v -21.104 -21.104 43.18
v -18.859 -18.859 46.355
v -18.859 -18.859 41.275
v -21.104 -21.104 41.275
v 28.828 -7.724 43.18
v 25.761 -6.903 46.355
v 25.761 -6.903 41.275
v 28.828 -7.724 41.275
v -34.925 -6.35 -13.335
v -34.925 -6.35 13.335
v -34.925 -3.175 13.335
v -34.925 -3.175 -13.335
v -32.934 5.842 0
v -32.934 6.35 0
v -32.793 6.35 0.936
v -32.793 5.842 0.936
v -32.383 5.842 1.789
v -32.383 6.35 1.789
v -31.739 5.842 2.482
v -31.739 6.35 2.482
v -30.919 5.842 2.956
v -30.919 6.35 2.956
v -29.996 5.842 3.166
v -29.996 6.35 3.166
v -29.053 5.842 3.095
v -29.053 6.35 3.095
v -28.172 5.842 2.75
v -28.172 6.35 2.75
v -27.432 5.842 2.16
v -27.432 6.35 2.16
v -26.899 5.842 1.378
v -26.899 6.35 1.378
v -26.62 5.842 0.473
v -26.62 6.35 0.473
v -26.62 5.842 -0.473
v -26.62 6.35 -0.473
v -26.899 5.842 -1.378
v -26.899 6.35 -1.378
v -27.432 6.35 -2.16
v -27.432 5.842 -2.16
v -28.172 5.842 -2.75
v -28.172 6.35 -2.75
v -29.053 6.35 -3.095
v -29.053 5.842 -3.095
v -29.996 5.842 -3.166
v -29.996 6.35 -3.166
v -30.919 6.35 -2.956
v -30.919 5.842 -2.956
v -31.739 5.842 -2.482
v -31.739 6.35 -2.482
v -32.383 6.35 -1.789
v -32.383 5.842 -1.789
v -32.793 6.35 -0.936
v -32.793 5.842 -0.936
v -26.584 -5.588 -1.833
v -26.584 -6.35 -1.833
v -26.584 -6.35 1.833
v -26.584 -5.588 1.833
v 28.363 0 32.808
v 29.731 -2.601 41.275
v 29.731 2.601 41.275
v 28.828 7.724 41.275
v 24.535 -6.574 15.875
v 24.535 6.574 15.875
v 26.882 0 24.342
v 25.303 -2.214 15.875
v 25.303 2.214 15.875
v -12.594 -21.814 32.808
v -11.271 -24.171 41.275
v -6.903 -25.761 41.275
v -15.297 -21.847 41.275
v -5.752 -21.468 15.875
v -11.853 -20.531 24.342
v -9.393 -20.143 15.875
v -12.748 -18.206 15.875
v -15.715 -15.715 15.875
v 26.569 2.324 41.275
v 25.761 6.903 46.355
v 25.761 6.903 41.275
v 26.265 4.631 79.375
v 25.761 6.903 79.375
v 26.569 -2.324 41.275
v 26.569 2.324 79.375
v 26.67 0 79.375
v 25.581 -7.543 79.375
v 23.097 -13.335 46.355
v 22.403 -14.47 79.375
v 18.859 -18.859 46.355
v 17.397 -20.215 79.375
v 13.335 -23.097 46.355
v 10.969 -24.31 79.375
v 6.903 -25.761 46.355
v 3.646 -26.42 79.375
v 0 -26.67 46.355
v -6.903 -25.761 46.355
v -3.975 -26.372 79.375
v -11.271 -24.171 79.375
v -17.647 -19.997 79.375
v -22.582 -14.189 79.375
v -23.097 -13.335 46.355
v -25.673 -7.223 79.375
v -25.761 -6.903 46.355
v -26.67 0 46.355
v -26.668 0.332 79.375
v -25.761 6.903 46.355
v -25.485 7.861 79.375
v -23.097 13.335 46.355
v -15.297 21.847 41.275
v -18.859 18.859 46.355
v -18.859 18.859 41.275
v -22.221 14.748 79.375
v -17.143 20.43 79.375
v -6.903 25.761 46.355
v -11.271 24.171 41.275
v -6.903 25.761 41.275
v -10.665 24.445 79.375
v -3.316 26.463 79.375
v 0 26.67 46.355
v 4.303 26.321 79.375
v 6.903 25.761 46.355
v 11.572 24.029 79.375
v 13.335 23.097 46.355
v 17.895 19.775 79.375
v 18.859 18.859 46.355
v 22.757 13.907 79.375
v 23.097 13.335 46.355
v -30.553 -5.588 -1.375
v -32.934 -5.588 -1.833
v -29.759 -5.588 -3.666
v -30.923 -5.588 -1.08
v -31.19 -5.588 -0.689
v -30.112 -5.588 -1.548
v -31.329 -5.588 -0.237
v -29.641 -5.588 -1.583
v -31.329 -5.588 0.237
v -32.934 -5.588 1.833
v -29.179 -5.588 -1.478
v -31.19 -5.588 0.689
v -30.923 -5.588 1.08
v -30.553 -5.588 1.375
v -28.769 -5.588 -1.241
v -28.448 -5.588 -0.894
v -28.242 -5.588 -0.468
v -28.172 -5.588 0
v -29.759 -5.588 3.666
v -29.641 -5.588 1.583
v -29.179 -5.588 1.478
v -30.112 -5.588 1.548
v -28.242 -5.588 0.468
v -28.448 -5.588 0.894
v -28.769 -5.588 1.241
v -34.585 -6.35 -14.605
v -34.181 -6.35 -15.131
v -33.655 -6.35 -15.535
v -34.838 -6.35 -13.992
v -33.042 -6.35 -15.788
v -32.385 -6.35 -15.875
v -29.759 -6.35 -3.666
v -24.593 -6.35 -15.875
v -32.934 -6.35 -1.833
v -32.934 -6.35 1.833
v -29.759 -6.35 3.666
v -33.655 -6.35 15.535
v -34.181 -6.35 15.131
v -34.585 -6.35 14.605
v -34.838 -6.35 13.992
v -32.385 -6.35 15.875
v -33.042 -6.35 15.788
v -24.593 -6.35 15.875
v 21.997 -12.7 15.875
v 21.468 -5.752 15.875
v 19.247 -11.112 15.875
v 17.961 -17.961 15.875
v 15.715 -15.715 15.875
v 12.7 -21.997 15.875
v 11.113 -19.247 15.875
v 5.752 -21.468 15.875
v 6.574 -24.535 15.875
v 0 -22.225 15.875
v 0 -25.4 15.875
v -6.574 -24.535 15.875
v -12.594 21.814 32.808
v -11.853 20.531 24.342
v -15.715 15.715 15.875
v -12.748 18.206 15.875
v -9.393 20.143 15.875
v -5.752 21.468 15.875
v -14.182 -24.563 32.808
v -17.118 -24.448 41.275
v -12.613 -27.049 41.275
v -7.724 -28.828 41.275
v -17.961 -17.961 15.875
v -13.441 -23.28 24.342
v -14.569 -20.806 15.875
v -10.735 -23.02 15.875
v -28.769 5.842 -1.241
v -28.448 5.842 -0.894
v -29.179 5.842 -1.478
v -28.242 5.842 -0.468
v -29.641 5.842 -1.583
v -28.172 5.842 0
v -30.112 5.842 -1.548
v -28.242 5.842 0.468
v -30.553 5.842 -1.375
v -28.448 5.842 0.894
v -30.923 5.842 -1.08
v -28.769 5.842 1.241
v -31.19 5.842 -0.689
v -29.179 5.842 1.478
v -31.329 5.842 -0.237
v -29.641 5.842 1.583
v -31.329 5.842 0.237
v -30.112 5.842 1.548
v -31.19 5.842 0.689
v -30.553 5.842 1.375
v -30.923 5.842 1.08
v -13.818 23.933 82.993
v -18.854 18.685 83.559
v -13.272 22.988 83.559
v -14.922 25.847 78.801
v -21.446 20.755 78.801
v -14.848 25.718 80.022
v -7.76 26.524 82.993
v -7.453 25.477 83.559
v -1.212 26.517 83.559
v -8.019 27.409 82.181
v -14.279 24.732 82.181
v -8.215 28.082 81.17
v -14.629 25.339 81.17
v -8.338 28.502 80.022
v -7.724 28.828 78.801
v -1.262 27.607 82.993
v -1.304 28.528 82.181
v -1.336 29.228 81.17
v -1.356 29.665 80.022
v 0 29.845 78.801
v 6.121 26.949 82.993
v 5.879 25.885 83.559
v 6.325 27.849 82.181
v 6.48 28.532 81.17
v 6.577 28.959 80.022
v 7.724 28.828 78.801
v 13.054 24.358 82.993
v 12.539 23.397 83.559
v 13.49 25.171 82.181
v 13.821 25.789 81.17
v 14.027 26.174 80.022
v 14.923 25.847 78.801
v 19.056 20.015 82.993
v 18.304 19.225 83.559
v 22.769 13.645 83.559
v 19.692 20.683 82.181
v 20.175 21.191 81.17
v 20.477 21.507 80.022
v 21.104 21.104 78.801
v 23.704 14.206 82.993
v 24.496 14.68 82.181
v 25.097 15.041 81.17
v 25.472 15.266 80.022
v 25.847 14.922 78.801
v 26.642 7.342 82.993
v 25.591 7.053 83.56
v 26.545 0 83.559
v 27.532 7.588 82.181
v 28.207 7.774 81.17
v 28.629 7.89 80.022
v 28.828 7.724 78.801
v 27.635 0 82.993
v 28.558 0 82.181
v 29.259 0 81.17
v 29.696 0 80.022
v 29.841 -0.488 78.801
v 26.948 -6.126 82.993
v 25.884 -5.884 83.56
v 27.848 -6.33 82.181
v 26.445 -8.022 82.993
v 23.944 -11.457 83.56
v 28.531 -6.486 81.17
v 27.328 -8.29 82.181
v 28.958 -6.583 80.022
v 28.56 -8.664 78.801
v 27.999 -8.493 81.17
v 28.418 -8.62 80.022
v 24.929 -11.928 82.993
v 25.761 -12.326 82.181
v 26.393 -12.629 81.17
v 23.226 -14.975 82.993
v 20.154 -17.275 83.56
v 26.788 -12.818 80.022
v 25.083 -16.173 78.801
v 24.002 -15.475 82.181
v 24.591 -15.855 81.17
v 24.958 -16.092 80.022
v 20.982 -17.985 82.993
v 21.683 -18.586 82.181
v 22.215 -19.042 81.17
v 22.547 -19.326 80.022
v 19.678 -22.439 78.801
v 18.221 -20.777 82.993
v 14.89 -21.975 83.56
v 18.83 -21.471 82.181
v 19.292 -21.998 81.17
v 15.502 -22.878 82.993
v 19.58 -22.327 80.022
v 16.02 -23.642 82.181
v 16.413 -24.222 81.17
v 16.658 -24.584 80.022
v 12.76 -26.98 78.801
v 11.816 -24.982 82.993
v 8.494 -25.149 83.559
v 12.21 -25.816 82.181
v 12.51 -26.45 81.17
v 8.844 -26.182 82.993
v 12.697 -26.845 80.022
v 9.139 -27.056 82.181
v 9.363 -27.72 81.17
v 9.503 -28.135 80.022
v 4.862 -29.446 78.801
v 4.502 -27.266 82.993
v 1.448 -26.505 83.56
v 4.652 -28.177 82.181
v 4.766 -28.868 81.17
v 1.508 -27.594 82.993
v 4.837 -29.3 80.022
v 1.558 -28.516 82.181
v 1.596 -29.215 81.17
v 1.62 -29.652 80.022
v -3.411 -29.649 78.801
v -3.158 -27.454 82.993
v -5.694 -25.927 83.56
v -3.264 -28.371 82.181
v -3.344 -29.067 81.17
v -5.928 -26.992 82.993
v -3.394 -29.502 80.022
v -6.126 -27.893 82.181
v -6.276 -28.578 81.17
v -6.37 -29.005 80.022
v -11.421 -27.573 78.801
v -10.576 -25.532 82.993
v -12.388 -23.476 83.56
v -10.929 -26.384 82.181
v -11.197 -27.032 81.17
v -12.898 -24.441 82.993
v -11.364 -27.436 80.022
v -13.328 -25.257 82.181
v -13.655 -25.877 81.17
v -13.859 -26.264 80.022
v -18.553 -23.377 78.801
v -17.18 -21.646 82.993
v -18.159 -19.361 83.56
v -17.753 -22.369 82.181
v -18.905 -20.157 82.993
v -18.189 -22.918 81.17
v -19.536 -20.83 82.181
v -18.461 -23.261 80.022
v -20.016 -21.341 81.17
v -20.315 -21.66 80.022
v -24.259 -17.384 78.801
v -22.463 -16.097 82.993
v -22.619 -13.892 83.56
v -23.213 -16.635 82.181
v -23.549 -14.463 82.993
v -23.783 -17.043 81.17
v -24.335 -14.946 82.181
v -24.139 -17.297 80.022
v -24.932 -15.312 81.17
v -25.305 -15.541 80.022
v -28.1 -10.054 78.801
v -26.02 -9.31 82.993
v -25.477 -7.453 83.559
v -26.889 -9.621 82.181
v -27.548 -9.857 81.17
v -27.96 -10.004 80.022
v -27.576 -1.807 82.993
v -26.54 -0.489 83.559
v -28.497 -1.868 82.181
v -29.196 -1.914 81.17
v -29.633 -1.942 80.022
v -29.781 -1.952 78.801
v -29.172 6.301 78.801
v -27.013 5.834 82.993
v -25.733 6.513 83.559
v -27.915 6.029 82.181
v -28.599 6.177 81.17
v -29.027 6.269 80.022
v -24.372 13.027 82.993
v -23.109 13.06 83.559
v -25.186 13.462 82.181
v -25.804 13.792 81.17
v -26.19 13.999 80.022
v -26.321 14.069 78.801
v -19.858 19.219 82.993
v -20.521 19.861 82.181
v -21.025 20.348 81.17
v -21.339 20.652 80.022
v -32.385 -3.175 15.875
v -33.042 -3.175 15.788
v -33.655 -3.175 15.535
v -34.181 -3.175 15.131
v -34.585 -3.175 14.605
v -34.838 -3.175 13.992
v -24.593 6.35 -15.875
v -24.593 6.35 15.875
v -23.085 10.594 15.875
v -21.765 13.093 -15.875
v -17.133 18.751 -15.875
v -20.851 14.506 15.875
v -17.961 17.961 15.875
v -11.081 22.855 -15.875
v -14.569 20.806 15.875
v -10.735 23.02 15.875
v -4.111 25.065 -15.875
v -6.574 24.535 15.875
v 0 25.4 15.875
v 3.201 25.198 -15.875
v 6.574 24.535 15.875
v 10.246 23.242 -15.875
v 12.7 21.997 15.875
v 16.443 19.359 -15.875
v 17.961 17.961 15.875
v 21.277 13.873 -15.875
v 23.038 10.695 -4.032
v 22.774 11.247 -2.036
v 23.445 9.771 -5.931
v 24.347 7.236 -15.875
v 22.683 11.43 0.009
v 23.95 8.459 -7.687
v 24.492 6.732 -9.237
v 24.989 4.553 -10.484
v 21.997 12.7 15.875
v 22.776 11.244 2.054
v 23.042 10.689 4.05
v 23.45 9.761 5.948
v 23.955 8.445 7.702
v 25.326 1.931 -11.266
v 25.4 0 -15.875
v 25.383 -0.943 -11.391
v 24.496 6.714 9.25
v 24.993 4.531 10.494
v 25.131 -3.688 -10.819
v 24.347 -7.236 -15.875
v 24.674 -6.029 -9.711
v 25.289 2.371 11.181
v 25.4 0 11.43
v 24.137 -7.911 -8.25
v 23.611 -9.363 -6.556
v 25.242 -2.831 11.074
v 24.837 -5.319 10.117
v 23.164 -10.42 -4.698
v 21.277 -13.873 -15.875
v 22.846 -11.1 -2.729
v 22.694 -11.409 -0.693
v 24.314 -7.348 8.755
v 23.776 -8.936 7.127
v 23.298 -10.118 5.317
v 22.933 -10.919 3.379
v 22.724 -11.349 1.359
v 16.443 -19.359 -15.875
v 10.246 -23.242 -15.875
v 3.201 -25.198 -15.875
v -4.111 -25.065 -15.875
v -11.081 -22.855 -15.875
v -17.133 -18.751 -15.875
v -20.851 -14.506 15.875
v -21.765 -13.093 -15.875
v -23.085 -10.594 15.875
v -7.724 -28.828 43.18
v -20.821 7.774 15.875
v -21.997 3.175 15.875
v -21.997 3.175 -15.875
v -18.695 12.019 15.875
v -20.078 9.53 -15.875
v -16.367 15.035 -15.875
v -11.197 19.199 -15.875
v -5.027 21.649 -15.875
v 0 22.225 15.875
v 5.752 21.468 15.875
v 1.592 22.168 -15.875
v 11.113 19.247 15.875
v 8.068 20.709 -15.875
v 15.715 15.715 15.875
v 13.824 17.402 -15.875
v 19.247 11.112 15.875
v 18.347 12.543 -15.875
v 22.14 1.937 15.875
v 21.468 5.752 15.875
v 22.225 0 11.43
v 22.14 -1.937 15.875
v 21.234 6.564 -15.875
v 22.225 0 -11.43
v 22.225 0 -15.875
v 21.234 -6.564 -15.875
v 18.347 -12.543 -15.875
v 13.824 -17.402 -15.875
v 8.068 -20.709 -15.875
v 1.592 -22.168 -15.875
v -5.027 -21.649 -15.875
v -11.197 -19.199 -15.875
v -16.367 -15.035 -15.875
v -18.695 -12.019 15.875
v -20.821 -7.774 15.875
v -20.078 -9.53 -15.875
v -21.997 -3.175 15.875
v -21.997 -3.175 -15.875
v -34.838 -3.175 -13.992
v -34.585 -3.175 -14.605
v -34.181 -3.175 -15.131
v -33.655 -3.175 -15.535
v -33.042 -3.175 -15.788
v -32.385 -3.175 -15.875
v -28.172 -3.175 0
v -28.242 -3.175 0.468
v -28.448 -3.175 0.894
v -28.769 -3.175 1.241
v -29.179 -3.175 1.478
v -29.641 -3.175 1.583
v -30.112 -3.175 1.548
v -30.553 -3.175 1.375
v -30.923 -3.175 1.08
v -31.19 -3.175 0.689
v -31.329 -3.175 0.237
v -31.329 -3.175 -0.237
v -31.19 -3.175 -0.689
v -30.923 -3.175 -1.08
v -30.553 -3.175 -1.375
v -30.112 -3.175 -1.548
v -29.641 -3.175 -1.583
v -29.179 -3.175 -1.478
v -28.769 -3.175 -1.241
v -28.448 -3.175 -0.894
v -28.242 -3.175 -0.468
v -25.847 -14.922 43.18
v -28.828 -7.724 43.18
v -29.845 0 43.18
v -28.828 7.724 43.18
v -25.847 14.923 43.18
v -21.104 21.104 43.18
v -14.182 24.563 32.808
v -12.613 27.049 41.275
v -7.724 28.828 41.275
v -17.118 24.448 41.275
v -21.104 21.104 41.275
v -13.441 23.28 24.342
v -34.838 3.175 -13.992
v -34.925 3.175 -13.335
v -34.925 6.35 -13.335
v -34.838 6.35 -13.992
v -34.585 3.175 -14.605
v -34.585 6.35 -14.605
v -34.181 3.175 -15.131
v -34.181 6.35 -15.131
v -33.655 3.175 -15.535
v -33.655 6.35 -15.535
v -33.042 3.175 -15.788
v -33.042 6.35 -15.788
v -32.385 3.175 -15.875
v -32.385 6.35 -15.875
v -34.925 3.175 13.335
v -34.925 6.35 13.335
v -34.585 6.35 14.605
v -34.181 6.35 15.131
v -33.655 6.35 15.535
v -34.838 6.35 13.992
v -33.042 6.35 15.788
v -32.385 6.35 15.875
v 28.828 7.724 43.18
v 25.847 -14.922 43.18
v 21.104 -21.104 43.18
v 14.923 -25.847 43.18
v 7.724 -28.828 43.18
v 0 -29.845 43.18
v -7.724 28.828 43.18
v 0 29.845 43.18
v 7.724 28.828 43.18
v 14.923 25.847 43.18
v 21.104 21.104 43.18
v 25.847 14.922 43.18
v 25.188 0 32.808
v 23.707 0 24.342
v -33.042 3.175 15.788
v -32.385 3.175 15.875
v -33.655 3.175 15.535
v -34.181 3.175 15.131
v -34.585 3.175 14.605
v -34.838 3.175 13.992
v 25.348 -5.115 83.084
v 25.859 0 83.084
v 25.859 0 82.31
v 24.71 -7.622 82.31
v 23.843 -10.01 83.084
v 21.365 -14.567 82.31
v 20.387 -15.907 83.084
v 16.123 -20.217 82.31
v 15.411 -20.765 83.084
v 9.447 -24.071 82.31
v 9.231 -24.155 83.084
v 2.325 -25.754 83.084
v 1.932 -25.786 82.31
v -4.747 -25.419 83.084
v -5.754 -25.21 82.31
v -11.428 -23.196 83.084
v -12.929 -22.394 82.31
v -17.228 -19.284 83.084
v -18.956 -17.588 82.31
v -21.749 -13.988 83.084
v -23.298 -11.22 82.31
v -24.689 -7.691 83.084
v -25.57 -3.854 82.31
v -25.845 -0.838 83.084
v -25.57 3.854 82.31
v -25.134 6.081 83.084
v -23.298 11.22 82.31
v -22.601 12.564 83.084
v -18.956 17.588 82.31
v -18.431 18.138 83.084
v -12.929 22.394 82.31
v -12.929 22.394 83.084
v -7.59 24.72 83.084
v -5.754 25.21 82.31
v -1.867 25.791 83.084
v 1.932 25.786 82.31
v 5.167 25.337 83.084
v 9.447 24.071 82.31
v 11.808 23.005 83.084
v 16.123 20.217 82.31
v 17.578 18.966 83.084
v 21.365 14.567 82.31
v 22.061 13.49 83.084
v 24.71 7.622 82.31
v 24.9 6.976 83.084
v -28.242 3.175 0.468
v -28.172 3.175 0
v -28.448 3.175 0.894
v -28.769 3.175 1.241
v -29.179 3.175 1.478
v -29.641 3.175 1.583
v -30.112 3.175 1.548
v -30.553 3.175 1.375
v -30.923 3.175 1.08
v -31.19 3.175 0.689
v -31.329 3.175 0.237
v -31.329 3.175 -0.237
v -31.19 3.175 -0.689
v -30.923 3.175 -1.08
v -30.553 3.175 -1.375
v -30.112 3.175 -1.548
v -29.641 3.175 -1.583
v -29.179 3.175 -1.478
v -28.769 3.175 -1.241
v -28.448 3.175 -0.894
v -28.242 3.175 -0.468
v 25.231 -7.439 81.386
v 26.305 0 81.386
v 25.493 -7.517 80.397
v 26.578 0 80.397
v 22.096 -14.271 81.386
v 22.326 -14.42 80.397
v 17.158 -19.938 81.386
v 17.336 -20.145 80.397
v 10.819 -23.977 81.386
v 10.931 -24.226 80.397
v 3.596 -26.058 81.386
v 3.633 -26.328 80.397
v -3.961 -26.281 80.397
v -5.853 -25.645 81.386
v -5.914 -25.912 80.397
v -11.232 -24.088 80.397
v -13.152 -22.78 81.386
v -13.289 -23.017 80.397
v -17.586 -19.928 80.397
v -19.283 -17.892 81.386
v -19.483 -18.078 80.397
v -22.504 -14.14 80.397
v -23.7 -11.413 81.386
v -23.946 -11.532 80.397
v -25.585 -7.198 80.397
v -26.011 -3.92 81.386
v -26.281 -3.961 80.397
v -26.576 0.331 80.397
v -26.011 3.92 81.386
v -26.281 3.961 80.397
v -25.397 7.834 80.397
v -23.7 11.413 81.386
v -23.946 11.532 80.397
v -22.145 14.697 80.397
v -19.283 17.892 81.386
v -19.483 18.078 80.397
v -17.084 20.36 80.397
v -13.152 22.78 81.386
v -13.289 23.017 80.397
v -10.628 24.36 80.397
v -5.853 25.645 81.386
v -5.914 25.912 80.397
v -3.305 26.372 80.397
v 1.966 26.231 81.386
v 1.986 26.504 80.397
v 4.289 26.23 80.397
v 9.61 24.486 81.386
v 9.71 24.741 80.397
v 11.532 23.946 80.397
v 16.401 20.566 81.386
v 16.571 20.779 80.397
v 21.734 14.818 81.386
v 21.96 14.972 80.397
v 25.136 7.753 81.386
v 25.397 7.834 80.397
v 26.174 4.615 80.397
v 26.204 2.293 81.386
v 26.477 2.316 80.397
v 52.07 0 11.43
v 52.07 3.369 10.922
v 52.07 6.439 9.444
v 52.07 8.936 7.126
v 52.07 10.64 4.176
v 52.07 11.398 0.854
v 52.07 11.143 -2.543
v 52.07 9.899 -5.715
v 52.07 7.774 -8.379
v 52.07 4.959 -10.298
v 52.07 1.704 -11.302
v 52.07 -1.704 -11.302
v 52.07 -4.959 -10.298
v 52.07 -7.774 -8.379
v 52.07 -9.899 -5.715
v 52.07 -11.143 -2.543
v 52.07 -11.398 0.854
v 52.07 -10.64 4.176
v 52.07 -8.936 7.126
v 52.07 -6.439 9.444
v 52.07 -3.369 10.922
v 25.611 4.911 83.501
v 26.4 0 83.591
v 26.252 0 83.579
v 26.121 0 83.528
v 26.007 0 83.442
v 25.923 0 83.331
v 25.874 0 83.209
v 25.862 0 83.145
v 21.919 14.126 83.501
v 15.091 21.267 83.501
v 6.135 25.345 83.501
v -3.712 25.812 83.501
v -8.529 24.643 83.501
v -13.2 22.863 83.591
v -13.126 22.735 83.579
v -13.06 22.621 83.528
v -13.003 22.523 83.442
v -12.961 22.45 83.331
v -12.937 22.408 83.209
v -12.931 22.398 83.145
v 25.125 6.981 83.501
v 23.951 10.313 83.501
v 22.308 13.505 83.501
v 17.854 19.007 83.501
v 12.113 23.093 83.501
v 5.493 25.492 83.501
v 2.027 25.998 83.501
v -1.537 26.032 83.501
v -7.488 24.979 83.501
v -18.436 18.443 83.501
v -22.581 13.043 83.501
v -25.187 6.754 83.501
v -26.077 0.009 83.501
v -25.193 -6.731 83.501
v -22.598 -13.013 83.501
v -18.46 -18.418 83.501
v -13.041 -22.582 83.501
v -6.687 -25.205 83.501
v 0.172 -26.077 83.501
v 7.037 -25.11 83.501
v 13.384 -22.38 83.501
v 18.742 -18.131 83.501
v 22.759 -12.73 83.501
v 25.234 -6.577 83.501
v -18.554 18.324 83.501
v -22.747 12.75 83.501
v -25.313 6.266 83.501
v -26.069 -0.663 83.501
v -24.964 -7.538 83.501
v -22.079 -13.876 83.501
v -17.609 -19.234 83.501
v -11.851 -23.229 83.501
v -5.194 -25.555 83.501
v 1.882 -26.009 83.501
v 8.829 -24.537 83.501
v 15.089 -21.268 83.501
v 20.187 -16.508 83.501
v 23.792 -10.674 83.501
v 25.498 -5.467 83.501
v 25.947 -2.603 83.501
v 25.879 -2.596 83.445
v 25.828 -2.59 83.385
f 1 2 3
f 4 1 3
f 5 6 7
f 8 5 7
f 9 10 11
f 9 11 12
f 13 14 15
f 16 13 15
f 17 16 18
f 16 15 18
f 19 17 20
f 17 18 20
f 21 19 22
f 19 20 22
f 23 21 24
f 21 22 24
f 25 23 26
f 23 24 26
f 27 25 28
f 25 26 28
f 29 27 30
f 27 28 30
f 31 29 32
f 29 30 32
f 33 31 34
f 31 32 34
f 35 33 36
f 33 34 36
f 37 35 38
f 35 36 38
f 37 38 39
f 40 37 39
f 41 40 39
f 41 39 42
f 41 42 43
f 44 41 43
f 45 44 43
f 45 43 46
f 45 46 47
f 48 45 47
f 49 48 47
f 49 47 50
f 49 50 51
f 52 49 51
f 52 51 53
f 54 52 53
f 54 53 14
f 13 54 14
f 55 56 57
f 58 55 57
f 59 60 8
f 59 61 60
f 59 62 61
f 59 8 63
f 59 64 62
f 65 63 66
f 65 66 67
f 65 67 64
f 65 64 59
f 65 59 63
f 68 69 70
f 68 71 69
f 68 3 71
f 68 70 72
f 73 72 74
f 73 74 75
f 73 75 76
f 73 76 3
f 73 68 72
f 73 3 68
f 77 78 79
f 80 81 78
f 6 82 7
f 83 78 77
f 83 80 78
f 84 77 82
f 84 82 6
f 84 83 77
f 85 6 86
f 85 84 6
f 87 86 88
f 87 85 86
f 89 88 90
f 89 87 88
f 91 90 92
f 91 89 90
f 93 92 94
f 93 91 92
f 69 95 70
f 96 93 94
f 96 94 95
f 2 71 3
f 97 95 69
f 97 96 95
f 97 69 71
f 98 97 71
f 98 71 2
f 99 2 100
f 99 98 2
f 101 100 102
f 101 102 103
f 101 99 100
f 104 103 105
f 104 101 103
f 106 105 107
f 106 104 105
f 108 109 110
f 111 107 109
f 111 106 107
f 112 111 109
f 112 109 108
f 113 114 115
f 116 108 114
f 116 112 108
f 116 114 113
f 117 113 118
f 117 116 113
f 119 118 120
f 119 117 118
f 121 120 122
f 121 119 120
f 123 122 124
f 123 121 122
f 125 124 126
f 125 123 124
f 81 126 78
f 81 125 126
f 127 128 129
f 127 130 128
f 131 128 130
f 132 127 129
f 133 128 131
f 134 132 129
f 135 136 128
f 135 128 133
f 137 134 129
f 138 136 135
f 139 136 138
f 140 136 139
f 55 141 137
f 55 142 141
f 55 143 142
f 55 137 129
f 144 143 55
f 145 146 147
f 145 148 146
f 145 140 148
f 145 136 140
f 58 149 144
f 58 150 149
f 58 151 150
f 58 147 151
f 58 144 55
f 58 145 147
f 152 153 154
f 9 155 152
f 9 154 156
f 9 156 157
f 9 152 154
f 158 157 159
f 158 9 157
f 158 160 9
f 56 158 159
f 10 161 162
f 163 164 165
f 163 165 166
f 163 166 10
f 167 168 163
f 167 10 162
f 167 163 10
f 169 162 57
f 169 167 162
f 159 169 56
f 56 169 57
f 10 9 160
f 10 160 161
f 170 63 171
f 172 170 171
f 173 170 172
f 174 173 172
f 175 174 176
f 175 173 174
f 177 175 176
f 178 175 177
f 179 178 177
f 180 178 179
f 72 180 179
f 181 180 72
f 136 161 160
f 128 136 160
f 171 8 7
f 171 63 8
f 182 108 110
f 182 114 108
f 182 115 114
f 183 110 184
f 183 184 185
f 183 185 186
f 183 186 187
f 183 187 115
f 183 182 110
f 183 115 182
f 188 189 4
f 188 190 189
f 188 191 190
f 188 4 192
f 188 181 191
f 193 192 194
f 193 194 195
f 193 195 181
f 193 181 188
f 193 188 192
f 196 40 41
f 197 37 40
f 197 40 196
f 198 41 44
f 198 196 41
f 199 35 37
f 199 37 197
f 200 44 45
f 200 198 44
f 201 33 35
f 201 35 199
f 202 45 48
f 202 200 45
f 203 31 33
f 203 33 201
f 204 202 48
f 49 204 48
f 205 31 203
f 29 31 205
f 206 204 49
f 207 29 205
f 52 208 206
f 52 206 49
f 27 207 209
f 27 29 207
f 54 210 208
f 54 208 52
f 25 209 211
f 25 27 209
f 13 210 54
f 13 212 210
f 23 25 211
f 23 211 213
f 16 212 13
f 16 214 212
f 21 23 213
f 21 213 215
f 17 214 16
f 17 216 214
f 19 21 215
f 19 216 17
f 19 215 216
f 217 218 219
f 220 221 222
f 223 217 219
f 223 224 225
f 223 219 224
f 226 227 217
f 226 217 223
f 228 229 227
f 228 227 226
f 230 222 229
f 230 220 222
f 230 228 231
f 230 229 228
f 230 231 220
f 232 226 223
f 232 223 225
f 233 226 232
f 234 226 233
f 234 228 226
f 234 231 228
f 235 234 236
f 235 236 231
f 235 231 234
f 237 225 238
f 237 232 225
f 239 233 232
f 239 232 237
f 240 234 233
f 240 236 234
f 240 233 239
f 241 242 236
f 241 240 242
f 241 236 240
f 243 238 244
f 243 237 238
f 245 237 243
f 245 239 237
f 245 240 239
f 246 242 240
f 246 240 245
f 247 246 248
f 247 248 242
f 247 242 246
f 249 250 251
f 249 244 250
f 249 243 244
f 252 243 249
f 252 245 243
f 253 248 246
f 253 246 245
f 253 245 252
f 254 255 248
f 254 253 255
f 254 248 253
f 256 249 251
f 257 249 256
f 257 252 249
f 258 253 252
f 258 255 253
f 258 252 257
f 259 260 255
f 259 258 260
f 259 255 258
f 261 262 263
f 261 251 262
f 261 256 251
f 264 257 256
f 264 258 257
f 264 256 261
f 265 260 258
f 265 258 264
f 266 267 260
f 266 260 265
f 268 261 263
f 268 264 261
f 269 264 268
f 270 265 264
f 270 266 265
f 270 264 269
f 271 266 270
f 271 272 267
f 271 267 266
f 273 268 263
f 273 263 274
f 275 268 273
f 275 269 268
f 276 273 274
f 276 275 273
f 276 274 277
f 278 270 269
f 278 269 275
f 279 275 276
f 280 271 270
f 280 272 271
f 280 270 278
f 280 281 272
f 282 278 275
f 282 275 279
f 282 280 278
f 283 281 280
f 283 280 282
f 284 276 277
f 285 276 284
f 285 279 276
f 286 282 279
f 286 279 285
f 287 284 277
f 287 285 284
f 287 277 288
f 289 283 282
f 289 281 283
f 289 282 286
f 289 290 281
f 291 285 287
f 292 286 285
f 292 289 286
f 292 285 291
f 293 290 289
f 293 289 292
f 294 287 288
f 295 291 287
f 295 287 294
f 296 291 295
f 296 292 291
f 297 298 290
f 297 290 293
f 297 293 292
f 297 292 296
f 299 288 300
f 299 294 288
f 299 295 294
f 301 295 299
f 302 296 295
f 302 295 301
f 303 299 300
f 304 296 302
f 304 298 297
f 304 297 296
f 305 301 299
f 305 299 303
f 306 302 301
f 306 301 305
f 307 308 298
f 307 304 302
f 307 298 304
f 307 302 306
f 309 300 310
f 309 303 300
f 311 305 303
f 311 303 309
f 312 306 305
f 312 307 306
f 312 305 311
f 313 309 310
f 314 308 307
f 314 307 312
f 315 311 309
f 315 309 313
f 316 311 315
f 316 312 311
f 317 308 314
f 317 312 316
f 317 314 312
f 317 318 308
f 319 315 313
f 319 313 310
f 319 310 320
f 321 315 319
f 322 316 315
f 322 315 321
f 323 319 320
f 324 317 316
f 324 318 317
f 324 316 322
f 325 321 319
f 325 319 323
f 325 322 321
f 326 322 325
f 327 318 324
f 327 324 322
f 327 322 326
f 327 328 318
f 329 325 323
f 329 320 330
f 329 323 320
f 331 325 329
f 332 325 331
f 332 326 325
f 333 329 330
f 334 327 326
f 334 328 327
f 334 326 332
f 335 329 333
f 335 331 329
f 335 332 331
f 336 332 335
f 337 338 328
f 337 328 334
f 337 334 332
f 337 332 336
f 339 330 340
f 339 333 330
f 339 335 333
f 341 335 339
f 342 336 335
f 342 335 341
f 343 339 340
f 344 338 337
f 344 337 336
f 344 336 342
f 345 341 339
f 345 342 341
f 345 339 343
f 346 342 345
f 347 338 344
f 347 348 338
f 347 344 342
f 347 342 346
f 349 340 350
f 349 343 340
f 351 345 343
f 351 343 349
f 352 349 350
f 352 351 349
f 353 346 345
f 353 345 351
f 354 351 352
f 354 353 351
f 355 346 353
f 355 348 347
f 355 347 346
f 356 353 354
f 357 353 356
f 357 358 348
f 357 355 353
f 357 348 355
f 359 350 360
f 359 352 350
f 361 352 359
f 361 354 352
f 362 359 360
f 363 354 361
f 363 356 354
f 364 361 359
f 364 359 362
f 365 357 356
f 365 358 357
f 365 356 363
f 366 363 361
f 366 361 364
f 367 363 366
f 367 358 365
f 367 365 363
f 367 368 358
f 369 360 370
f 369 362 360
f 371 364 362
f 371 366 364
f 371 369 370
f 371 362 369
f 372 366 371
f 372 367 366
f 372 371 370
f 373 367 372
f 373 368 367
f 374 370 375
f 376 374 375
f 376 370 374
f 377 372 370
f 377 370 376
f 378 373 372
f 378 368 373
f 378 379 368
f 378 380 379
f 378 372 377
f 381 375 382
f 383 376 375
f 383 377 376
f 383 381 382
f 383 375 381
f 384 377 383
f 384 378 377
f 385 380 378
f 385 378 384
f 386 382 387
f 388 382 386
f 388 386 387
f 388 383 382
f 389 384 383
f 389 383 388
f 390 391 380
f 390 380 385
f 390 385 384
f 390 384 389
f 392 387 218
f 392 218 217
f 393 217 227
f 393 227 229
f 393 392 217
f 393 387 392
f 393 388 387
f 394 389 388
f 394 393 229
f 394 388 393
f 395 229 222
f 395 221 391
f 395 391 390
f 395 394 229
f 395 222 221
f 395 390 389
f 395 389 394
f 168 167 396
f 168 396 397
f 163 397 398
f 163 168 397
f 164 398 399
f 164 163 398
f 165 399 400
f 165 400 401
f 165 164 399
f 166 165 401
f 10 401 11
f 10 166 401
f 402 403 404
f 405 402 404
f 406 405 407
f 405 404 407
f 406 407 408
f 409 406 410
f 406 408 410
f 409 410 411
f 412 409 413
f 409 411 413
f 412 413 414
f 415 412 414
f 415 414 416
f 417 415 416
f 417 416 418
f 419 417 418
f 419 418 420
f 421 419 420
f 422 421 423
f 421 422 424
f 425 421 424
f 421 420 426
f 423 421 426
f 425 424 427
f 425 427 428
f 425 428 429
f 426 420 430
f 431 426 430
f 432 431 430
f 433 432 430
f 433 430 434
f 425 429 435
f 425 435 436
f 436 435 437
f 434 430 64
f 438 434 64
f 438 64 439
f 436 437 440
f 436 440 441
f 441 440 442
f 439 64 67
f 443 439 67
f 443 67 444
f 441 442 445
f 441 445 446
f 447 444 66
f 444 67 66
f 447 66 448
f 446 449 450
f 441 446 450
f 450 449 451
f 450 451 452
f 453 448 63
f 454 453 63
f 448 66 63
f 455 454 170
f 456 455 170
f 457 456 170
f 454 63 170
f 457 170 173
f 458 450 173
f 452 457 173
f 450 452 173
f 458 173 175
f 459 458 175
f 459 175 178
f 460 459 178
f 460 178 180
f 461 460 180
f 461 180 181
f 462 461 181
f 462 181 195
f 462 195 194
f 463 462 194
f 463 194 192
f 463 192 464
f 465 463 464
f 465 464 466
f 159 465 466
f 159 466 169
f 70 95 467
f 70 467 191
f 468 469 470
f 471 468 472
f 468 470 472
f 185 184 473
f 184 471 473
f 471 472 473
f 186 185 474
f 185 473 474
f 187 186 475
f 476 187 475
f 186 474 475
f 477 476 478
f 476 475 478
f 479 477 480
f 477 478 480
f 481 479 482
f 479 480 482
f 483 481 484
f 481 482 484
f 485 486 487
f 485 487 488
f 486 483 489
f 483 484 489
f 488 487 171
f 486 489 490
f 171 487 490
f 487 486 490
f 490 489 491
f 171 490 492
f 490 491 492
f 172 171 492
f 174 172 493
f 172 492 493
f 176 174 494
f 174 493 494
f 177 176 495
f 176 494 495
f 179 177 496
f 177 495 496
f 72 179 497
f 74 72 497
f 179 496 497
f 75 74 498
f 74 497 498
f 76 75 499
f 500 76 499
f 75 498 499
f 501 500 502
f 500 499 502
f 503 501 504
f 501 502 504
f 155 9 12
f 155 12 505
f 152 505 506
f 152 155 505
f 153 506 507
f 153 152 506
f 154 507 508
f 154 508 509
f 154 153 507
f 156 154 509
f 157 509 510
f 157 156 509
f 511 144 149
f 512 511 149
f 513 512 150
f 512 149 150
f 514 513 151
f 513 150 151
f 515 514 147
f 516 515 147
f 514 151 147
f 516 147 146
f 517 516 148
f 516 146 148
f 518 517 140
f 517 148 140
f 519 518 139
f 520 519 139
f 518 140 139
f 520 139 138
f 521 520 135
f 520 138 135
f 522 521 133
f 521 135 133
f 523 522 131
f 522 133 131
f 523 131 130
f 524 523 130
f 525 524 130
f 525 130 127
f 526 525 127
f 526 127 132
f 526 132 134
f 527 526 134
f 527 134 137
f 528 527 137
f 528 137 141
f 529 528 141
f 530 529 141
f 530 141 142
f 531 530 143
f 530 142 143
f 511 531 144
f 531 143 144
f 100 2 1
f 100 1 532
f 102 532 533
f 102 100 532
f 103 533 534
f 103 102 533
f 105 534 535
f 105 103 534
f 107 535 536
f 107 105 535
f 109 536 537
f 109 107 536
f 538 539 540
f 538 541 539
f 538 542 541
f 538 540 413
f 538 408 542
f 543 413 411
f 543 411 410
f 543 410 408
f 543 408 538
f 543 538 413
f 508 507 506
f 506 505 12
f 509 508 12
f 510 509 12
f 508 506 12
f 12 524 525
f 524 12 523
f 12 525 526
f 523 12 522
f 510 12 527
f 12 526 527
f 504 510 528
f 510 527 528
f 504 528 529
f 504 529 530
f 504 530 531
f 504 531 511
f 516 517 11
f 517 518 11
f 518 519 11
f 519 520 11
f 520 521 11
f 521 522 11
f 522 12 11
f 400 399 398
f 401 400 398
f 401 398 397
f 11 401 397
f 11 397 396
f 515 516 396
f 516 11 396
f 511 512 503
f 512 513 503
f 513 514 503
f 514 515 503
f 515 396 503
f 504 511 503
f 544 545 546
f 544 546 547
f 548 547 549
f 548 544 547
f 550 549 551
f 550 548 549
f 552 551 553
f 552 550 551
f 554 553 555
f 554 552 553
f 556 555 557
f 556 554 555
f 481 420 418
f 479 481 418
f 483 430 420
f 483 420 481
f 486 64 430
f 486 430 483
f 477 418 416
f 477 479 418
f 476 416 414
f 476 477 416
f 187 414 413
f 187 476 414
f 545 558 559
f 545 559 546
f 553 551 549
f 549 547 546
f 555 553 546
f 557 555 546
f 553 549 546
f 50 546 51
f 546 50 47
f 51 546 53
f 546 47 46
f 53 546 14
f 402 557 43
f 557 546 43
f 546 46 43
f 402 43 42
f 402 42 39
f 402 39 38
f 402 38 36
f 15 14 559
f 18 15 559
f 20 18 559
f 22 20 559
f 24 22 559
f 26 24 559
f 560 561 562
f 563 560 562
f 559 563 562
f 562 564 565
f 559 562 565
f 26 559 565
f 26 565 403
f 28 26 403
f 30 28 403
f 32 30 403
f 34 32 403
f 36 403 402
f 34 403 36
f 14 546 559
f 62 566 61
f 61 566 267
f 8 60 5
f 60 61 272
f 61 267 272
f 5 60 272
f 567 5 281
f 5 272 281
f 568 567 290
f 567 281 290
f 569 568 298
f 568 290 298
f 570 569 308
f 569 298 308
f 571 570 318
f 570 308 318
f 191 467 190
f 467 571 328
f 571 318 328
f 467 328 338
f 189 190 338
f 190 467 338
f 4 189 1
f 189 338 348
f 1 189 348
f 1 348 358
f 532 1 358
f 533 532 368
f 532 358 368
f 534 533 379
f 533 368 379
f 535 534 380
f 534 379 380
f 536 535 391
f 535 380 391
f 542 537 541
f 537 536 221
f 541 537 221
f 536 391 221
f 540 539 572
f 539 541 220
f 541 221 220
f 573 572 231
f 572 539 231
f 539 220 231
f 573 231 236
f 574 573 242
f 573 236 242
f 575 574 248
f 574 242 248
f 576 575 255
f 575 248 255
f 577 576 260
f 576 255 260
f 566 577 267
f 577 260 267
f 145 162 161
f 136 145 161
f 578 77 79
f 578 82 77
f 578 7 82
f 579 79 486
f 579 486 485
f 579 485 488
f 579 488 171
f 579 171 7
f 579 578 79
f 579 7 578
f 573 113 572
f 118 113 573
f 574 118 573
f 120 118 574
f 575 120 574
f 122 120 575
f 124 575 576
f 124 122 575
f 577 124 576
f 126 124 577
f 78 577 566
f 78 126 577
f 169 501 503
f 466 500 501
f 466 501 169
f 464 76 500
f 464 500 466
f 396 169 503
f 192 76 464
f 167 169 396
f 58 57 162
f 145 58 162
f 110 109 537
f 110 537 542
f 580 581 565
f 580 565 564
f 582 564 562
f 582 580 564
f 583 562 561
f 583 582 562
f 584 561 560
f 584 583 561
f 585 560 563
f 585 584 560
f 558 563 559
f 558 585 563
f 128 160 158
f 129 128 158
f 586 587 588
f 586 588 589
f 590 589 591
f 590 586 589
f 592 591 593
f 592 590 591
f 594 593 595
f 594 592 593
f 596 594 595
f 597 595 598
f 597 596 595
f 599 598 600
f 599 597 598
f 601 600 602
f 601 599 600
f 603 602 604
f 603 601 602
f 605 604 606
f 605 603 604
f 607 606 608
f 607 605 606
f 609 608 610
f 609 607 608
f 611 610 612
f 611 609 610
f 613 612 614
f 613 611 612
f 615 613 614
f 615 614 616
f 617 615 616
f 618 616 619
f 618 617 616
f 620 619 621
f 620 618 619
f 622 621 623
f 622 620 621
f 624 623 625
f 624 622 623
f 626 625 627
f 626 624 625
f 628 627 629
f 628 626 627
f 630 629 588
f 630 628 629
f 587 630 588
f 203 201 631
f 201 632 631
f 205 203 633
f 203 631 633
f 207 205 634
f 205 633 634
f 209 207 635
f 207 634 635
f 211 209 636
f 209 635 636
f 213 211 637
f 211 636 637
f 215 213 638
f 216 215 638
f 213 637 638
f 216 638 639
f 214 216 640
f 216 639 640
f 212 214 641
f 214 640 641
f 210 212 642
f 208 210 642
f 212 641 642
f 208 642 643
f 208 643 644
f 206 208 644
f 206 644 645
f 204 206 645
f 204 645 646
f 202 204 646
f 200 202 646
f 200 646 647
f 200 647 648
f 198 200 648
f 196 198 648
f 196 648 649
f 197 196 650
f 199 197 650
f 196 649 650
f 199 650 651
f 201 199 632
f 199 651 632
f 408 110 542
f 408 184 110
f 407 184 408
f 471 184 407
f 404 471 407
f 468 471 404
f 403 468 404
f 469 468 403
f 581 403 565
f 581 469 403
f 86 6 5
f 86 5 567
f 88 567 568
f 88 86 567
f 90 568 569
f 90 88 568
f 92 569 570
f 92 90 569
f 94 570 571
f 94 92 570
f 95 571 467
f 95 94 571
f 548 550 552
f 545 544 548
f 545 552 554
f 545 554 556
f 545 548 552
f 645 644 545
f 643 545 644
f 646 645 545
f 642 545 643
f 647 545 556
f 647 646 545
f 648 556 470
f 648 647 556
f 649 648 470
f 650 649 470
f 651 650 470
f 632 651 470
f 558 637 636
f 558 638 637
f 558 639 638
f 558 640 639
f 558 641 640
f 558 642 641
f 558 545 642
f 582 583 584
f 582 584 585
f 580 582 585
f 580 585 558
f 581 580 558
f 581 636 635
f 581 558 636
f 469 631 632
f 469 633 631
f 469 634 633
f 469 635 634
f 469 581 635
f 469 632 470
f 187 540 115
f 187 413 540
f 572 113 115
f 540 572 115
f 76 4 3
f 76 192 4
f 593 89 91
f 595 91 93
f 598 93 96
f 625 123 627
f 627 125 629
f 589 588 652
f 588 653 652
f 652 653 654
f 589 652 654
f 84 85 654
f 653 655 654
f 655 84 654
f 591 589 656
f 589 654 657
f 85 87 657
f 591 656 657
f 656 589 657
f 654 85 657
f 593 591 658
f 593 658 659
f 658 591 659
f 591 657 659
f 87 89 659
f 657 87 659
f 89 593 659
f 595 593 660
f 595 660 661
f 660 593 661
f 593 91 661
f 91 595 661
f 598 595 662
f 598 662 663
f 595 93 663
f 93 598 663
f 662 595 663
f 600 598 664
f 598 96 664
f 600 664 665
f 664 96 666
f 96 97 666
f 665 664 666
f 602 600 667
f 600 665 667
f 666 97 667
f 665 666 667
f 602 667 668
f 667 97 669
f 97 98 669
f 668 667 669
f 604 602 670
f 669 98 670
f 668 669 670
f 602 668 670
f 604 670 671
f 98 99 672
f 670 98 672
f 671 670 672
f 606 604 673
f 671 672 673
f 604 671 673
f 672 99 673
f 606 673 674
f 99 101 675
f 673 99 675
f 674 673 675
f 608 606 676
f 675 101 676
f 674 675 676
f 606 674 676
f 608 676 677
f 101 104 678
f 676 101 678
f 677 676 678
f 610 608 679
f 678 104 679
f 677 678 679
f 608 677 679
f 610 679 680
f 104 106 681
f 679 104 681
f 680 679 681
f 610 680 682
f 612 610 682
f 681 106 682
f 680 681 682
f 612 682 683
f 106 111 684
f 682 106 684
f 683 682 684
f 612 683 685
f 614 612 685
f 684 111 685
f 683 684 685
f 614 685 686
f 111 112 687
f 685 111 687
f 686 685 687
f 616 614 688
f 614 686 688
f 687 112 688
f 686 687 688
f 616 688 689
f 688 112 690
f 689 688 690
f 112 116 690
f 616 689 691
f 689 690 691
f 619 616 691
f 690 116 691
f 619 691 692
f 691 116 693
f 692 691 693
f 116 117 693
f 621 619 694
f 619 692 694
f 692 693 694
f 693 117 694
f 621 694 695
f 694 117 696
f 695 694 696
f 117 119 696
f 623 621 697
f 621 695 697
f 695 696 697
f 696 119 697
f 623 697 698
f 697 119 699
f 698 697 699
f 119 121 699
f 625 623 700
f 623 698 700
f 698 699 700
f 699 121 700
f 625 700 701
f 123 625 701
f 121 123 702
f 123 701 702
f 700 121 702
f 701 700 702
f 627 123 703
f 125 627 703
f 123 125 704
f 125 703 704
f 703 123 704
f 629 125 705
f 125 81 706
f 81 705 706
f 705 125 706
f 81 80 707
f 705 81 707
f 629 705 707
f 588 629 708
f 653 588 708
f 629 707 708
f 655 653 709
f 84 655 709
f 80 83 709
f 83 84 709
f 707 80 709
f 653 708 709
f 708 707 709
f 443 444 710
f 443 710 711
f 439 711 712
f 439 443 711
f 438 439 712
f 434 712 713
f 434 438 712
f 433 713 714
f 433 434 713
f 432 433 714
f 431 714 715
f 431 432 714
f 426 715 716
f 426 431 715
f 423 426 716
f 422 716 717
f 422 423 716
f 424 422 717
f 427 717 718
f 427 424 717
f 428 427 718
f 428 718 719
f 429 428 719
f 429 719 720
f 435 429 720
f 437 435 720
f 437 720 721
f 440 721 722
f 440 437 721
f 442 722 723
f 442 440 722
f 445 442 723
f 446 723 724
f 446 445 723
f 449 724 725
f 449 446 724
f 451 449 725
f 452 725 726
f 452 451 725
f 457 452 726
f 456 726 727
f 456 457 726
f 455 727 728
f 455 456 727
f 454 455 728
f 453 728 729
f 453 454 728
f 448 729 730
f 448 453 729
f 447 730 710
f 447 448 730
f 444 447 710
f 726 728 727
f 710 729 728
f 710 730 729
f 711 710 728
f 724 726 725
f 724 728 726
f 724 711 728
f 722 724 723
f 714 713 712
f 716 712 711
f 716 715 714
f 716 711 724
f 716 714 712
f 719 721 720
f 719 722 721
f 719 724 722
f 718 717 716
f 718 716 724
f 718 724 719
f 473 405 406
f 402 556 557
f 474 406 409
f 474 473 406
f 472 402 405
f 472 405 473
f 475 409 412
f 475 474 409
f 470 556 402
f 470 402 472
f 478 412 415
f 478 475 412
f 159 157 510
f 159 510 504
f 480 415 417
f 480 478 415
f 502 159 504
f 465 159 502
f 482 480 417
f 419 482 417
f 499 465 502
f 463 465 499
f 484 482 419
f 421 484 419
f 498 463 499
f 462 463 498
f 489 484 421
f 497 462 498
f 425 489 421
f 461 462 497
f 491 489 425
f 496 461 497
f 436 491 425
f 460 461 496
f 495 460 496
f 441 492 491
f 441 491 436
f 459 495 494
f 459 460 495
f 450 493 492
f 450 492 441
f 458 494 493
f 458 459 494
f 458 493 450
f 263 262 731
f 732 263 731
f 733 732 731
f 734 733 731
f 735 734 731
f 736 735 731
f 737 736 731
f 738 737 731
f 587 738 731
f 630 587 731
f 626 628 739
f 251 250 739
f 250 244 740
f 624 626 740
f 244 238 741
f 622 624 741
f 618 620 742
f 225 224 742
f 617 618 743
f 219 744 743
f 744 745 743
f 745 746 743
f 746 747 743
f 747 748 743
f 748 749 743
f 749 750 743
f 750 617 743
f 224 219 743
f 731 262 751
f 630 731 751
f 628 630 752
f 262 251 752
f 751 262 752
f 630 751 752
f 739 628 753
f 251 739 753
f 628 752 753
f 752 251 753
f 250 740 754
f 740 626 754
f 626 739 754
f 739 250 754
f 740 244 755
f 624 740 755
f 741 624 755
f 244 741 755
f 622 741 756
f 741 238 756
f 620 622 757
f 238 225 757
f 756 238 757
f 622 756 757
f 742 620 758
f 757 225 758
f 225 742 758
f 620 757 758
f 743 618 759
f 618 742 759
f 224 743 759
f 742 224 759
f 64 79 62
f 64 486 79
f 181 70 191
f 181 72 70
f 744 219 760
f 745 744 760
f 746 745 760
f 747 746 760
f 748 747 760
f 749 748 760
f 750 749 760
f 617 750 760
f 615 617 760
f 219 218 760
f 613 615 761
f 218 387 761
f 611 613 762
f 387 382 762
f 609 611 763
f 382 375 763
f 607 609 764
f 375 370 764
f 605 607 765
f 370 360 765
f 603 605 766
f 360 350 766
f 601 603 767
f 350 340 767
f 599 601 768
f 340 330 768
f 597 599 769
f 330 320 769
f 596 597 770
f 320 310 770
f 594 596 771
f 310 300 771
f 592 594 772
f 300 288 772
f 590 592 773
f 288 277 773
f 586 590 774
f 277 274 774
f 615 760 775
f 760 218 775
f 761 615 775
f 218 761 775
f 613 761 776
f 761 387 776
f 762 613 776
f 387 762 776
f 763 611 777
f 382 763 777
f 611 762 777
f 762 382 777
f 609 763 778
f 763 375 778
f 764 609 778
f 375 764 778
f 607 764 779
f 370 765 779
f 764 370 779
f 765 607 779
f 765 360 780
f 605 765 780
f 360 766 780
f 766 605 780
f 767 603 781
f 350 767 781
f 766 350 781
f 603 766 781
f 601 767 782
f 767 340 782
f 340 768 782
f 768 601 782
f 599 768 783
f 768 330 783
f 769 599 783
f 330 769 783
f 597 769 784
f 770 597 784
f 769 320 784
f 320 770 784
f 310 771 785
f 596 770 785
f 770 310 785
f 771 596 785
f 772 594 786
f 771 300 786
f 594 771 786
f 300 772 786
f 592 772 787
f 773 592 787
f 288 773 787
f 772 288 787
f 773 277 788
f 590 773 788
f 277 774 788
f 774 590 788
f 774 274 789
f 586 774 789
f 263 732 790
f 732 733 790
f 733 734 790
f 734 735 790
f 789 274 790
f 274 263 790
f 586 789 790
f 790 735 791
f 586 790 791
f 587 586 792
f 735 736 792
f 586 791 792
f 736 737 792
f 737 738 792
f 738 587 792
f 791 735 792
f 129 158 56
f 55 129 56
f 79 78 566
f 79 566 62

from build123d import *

# Parameters (mm, degrees)
F0_W           = 3.175
F0_H           = 38.1
F1_ANGLE_BACK  = 15
F1_ANGLE       = 30
F0_H_2         = 15.875
F0_H_3         = 11.43
F0_H_4         = 4.445
F0_W_2         = 3.9863166107
F0_H_5         = 1.4520821328
F5_COUNT       = 3
F5_ANGLE       = 240
F6_DEPTH       = 6.35
F0_W_3         = 17.383622241
F0_H_6         = 31.75
F7_DEPTH       = 3.175
F9_D           = 3.175
F9_CBORE_D     = 6.35
F9_CBORE_DEPTH = 0.508
F10_R          = 1.5875
F11_DEPTH      = 0.762
F13_R          = 0.508
F15_T2_ANGLE   = 90
F15_T4_ANGLE   = 90
F15_T6_ANGLE   = 90
F0_W_4         = 26.67


# Not quite as in the source:
# - a fillet or chamfer that OpenCascade refuses, or shapes differently, is made with other operations: its cross-section is extruded or revolved along the edge and cut away or added


with BuildPart() as f1:
    # F0 (on Front) → F1 (revolve)
    with BuildSketch(Plane.XZ, mode=Mode.PRIVATE) as f1_sk:
        with Locations((28.2575, 60.325)):
            Rectangle(F0_W, F0_H)
    revolve(f1_sk.sketch.rotate(Axis((0, 0, 31.75), (0, 0, -1)), -F1_ANGLE_BACK), axis=Axis((0, 0, 31.75), (0, 0, -1)), revolution_arc=F1_ANGLE)



with BuildPart() as f1b:
    # F0 (on Front) → F1, piece 2 (revolve)
    with BuildSketch(Plane.XZ, mode=Mode.PRIVATE) as f1_sk:
        with Locations((23.8125, -7.9375)):
            Rectangle(F0_W, F0_H_2)
        with Locations((23.8125, 5.715)):
            Rectangle(F0_W, F0_H_3)
        with Locations((23.8125, 13.6525)):
            Rectangle(F0_W, F0_H_4)
    revolve(f1_sk.sketch.rotate(Axis((0, 0, 31.75), (0, 0, -1)), -F1_ANGLE_BACK), axis=Axis((0, 0, 31.75), (0, 0, -1)), revolution_arc=F1_ANGLE)


with BuildPart() as f1_1:
    add(f1.part)

    add(f1b.part)  # F2 merges F1b
    # F1_face (on face) → F2 section 0
    with BuildSketch(Plane(origin=(27.9652046604, 0, 41.275), x_dir=(1, 0, 0), z_dir=(0, 0, -1))):
        with BuildLine():
            ThreePointArc((-2.2039628732, 6.9027039329), (-1.2952046604, 0), (-2.2039628732, -6.9027039329))
            Line((-2.2039628732, -6.9027039329), (0.8628516252, -7.7244544011))
            ThreePointArc((0.8628516252, -7.7244544011), (1.8797953396, 0), (0.8628516252, 7.7244544011))
            Line((0.8628516252, 7.7244544011), (-2.2039628732, 6.9027039329))
        make_face()
    # F1_face1 (on face) → F2 section 1
    with BuildSketch(Plane(origin=(23.5762929935, 0, 15.875), x_dir=(1, 0, 0), z_dir=(0, 0, 1))):
        with BuildLine():
            ThreePointArc((0.9582229943, -6.5740037456), (1.8237070065, 0), (0.9582229943, 6.5740037456))
            Line((0.9582229943, 6.5740037456), (-2.1085915042, 5.7522532774))
            ThreePointArc((-2.1085915042, 5.7522532774), (-1.3512929935, 0), (-2.1085915042, -5.7522532774))
            Line((-2.1085915042, -5.7522532774), (0.9582229943, -6.5740037456))
        make_face()
    loft()

    # F0 (on Front) → F3 (revolve)
    with BuildSketch(Plane.XZ):
        with Locations((28.2575, 60.325)):
            Rectangle(F0_W, F0_H)
        with Locations((23.8125, -7.9375)):
            Rectangle(F0_W, F0_H_2)
        with Locations((23.8125, 5.715)):
            Rectangle(F0_W, F0_H_3)
        with Locations((23.8125, 13.6525)):
            Rectangle(F0_W, F0_H_4)
        with BuildLine():
            ThreePointArc((25.8586833893, 82.3102101397), (26.4634380154, 80.8976369566), (26.67, 79.375))
            Line((26.67, 79.375), (29.845, 79.375))
            Line((29.845, 79.375), (29.845, 82.3102101397))
            Line((29.845, 82.3102101397), (25.8586833893, 82.3102101397))
        make_face()
        with Locations((27.8518416946, 83.0362512061)):
            Rectangle(F0_W_2, F0_H_5)
    revolve(axis=Axis((0, 0, 31.75), (0, 0, -1)))

    # F4: union 


with BuildPart() as f5_1:
    # F5: instance of F1
    add(f1_1.part.rotate(Axis((0, 0, 31.75), (0, 0, -1)), 1 * F5_ANGLE / (F5_COUNT - 1)))


with BuildPart() as f5_2:
    # F5: instance of F1
    add(f1_1.part.rotate(Axis((0, 0, 31.75), (0, 0, -1)), 2 * F5_ANGLE / (F5_COUNT - 1)))


with BuildPart() as f1_2:
    add(f1_1.part)

    add(f5_1.part)  # F6 merges F5_1

    add(f5_2.part)  # F6 merges F5_2
    # F0 (on Front) → F6 (join, symmetric)
    with BuildSketch(Plane.XZ):
        with BuildLine():
            Line((-32.385, -15.875), (-22.225, -15.875))
            Line((-22.225, -15.875), (-22.225, 15.875))
            Line((-22.225, 15.875), (-32.385, 15.875))
            ThreePointArc((-32.385, 15.875), (-34.1810512242, 15.1310512242), (-34.925, 13.335))
            Line((-34.925, 13.335), (-34.925, -13.335))
            ThreePointArc((-34.925, -13.335), (-34.1810512242, -15.1310512242), (-32.385, -15.875))
        make_face()
    extrude(amount=F6_DEPTH, both=True)

    # F0 (on Front) → F7 (cut, symmetric)
    with BuildSketch(Plane.XZ):
        with BuildLine():
            Line((-4.841377759, -29.4260326773), (-4.841377759, -15.875))
            Line((-4.841377759, -15.875), (-22.225, -15.875))
            Line((-22.225, -15.875), (-32.385, -15.875))
            ThreePointArc((-32.385, -15.875), (-34.1810512242, -15.1310512242), (-34.925, -13.335))
            Line((-34.925, -13.335), (-34.925, 13.335))
            ThreePointArc((-34.925, 13.335), (-34.1810512242, 15.1310512242), (-32.385, 15.875))
            Line((-32.385, 15.875), (-22.225, 15.875))
            Line((-22.225, 15.875), (-4.841377759, 15.875))
            Line((-4.841377759, 15.875), (-4.841377759, 29.4260326773))
            Line((-4.841377759, 29.4260326773), (-39.608622241, 29.4260326773))
            Line((-39.608622241, 29.4260326773), (-39.608622241, -29.4260326773))
            Line((-39.608622241, -29.4260326773), (-4.841377759, -29.4260326773))
        make_face()
        with Locations((-13.5331888795, 0)):
            Rectangle(F0_W_3, F0_H_6)
        with BuildLine():
            Line((-32.385, -15.875), (-22.225, -15.875))
            Line((-22.225, -15.875), (-22.225, 15.875))
            Line((-22.225, 15.875), (-32.385, 15.875))
            ThreePointArc((-32.385, 15.875), (-34.1810512242, 15.1310512242), (-34.925, 13.335))
            Line((-34.925, 13.335), (-34.925, -13.335))
            ThreePointArc((-34.925, -13.335), (-34.1810512242, -15.1310512242), (-32.385, -15.875))
        make_face()
    extrude(amount=F7_DEPTH, both=True, mode=Mode.SUBTRACT)

    # F9 (through all)
    with Locations(Plane(origin=(0, 6.35, 0), x_dir=(-1, 0, 0), z_dir=(0, 1, 0))):
        with Locations((29.7592221242, 0)):
            CounterBoreHole(F9_D / 2, F9_CBORE_D / 2, F9_CBORE_DEPTH)

    # F10 (on face) → F11 (cut)
    with BuildSketch(Plane.XZ.offset(6.35)):
        Polygon((-29.7592221242, -3.6661742094), (-26.5842221242, -1.8330871047), (-26.5842221242, 1.8330871047), (-29.7592221242, 3.6661742094), (-32.9342221242, 1.8330871047), (-32.9342221242, -1.8330871047), align=None)
        with Locations((-29.7592221242, 0)):
            Circle(F10_R, mode=Mode.SUBTRACT)
    extrude(amount=-F11_DEPTH, mode=Mode.SUBTRACT)

    # F12: fillet of radius 5.08 on 1 edges, made by hand

    # F12_s1 → F12_t2 (revolve, cut)
    with BuildSketch(Plane(origin=(0, 0, 0), x_dir=(0, 0, 1), z_dir=(-0.8660254038, -0.5, 0))):
        with BuildLine():
            ThreePointArc((83.7622922724, 25.8586833893), (81.9834385897, 28.7249439149), (78.8014197036, 29.845))
            Line((78.8014197036, 29.845), (83.7622922724, 29.845))
            Line((83.7622922724, 29.845), (83.7622922724, 25.8586833893))
        make_face()
    revolve(axis=Axis((0, 0, 83.7622922724), (0, 0, -1)), mode=Mode.SUBTRACT)

    # F13
    f13_edges = [f1_2.edges().sort_by_distance(p)[0] for p in [
        (12.929342, -22.394277, 83.762292),
    ]]
    fillet(f13_edges, radius=F13_R)

    # F14: union 

    # F15: chamfer of 5.08 on 3 edges, made by hand

    # F15_s1 → F15_t2 (revolve, cut)
    with BuildSketch(Plane(origin=(0, 0, 0), x_dir=(0, 0, 1), z_dir=(0.7071067812, -0.7071067812, 0))):
        Polygon((41.275, 31.75), (46.355, 26.67), (41.275, 26.67), align=None)
    revolve(axis=Axis((0, 0, 41.275), (0, 0, -1)), revolution_arc=F15_T2_ANGLE, mode=Mode.SUBTRACT)

    # F15_s3 → F15_t4 (revolve, cut)
    with BuildSketch(Plane(origin=(0, 0, 0), x_dir=(0, 0, 1), z_dir=(0.2588190451, 0.9659258263, 0))):
        Polygon((41.275, 31.75), (46.355, 26.67), (41.275, 26.67), align=None)
    revolve(axis=Axis((0, 0, 41.275), (0, 0, -1)), revolution_arc=F15_T4_ANGLE, mode=Mode.SUBTRACT)

    # F15_s5 → F15_t6 (revolve, cut)
    with BuildSketch(Plane(origin=(0, 0, 0), x_dir=(0, 0, 1), z_dir=(-0.9659258263, -0.2588190451, 0))):
        Polygon((41.275, 31.75), (46.355, 26.67), (41.275, 26.67), align=None)
    revolve(axis=Axis((0, 0, 41.275), (0, 0, -1)), revolution_arc=F15_T6_ANGLE, mode=Mode.SUBTRACT)

    # F0 (on Front) → F16 (revolve)
    with BuildSketch(Plane.XZ):
        with Locations((38.735, 5.715)):
            Rectangle(F0_W_4, F0_H_3)
        with Locations((23.8125, 5.715)):
            Rectangle(F0_W, F0_H_3)
    revolve(axis=Axis((38.735, 0, 0), (-1, 0, 0)))


solid = f1_2.part
